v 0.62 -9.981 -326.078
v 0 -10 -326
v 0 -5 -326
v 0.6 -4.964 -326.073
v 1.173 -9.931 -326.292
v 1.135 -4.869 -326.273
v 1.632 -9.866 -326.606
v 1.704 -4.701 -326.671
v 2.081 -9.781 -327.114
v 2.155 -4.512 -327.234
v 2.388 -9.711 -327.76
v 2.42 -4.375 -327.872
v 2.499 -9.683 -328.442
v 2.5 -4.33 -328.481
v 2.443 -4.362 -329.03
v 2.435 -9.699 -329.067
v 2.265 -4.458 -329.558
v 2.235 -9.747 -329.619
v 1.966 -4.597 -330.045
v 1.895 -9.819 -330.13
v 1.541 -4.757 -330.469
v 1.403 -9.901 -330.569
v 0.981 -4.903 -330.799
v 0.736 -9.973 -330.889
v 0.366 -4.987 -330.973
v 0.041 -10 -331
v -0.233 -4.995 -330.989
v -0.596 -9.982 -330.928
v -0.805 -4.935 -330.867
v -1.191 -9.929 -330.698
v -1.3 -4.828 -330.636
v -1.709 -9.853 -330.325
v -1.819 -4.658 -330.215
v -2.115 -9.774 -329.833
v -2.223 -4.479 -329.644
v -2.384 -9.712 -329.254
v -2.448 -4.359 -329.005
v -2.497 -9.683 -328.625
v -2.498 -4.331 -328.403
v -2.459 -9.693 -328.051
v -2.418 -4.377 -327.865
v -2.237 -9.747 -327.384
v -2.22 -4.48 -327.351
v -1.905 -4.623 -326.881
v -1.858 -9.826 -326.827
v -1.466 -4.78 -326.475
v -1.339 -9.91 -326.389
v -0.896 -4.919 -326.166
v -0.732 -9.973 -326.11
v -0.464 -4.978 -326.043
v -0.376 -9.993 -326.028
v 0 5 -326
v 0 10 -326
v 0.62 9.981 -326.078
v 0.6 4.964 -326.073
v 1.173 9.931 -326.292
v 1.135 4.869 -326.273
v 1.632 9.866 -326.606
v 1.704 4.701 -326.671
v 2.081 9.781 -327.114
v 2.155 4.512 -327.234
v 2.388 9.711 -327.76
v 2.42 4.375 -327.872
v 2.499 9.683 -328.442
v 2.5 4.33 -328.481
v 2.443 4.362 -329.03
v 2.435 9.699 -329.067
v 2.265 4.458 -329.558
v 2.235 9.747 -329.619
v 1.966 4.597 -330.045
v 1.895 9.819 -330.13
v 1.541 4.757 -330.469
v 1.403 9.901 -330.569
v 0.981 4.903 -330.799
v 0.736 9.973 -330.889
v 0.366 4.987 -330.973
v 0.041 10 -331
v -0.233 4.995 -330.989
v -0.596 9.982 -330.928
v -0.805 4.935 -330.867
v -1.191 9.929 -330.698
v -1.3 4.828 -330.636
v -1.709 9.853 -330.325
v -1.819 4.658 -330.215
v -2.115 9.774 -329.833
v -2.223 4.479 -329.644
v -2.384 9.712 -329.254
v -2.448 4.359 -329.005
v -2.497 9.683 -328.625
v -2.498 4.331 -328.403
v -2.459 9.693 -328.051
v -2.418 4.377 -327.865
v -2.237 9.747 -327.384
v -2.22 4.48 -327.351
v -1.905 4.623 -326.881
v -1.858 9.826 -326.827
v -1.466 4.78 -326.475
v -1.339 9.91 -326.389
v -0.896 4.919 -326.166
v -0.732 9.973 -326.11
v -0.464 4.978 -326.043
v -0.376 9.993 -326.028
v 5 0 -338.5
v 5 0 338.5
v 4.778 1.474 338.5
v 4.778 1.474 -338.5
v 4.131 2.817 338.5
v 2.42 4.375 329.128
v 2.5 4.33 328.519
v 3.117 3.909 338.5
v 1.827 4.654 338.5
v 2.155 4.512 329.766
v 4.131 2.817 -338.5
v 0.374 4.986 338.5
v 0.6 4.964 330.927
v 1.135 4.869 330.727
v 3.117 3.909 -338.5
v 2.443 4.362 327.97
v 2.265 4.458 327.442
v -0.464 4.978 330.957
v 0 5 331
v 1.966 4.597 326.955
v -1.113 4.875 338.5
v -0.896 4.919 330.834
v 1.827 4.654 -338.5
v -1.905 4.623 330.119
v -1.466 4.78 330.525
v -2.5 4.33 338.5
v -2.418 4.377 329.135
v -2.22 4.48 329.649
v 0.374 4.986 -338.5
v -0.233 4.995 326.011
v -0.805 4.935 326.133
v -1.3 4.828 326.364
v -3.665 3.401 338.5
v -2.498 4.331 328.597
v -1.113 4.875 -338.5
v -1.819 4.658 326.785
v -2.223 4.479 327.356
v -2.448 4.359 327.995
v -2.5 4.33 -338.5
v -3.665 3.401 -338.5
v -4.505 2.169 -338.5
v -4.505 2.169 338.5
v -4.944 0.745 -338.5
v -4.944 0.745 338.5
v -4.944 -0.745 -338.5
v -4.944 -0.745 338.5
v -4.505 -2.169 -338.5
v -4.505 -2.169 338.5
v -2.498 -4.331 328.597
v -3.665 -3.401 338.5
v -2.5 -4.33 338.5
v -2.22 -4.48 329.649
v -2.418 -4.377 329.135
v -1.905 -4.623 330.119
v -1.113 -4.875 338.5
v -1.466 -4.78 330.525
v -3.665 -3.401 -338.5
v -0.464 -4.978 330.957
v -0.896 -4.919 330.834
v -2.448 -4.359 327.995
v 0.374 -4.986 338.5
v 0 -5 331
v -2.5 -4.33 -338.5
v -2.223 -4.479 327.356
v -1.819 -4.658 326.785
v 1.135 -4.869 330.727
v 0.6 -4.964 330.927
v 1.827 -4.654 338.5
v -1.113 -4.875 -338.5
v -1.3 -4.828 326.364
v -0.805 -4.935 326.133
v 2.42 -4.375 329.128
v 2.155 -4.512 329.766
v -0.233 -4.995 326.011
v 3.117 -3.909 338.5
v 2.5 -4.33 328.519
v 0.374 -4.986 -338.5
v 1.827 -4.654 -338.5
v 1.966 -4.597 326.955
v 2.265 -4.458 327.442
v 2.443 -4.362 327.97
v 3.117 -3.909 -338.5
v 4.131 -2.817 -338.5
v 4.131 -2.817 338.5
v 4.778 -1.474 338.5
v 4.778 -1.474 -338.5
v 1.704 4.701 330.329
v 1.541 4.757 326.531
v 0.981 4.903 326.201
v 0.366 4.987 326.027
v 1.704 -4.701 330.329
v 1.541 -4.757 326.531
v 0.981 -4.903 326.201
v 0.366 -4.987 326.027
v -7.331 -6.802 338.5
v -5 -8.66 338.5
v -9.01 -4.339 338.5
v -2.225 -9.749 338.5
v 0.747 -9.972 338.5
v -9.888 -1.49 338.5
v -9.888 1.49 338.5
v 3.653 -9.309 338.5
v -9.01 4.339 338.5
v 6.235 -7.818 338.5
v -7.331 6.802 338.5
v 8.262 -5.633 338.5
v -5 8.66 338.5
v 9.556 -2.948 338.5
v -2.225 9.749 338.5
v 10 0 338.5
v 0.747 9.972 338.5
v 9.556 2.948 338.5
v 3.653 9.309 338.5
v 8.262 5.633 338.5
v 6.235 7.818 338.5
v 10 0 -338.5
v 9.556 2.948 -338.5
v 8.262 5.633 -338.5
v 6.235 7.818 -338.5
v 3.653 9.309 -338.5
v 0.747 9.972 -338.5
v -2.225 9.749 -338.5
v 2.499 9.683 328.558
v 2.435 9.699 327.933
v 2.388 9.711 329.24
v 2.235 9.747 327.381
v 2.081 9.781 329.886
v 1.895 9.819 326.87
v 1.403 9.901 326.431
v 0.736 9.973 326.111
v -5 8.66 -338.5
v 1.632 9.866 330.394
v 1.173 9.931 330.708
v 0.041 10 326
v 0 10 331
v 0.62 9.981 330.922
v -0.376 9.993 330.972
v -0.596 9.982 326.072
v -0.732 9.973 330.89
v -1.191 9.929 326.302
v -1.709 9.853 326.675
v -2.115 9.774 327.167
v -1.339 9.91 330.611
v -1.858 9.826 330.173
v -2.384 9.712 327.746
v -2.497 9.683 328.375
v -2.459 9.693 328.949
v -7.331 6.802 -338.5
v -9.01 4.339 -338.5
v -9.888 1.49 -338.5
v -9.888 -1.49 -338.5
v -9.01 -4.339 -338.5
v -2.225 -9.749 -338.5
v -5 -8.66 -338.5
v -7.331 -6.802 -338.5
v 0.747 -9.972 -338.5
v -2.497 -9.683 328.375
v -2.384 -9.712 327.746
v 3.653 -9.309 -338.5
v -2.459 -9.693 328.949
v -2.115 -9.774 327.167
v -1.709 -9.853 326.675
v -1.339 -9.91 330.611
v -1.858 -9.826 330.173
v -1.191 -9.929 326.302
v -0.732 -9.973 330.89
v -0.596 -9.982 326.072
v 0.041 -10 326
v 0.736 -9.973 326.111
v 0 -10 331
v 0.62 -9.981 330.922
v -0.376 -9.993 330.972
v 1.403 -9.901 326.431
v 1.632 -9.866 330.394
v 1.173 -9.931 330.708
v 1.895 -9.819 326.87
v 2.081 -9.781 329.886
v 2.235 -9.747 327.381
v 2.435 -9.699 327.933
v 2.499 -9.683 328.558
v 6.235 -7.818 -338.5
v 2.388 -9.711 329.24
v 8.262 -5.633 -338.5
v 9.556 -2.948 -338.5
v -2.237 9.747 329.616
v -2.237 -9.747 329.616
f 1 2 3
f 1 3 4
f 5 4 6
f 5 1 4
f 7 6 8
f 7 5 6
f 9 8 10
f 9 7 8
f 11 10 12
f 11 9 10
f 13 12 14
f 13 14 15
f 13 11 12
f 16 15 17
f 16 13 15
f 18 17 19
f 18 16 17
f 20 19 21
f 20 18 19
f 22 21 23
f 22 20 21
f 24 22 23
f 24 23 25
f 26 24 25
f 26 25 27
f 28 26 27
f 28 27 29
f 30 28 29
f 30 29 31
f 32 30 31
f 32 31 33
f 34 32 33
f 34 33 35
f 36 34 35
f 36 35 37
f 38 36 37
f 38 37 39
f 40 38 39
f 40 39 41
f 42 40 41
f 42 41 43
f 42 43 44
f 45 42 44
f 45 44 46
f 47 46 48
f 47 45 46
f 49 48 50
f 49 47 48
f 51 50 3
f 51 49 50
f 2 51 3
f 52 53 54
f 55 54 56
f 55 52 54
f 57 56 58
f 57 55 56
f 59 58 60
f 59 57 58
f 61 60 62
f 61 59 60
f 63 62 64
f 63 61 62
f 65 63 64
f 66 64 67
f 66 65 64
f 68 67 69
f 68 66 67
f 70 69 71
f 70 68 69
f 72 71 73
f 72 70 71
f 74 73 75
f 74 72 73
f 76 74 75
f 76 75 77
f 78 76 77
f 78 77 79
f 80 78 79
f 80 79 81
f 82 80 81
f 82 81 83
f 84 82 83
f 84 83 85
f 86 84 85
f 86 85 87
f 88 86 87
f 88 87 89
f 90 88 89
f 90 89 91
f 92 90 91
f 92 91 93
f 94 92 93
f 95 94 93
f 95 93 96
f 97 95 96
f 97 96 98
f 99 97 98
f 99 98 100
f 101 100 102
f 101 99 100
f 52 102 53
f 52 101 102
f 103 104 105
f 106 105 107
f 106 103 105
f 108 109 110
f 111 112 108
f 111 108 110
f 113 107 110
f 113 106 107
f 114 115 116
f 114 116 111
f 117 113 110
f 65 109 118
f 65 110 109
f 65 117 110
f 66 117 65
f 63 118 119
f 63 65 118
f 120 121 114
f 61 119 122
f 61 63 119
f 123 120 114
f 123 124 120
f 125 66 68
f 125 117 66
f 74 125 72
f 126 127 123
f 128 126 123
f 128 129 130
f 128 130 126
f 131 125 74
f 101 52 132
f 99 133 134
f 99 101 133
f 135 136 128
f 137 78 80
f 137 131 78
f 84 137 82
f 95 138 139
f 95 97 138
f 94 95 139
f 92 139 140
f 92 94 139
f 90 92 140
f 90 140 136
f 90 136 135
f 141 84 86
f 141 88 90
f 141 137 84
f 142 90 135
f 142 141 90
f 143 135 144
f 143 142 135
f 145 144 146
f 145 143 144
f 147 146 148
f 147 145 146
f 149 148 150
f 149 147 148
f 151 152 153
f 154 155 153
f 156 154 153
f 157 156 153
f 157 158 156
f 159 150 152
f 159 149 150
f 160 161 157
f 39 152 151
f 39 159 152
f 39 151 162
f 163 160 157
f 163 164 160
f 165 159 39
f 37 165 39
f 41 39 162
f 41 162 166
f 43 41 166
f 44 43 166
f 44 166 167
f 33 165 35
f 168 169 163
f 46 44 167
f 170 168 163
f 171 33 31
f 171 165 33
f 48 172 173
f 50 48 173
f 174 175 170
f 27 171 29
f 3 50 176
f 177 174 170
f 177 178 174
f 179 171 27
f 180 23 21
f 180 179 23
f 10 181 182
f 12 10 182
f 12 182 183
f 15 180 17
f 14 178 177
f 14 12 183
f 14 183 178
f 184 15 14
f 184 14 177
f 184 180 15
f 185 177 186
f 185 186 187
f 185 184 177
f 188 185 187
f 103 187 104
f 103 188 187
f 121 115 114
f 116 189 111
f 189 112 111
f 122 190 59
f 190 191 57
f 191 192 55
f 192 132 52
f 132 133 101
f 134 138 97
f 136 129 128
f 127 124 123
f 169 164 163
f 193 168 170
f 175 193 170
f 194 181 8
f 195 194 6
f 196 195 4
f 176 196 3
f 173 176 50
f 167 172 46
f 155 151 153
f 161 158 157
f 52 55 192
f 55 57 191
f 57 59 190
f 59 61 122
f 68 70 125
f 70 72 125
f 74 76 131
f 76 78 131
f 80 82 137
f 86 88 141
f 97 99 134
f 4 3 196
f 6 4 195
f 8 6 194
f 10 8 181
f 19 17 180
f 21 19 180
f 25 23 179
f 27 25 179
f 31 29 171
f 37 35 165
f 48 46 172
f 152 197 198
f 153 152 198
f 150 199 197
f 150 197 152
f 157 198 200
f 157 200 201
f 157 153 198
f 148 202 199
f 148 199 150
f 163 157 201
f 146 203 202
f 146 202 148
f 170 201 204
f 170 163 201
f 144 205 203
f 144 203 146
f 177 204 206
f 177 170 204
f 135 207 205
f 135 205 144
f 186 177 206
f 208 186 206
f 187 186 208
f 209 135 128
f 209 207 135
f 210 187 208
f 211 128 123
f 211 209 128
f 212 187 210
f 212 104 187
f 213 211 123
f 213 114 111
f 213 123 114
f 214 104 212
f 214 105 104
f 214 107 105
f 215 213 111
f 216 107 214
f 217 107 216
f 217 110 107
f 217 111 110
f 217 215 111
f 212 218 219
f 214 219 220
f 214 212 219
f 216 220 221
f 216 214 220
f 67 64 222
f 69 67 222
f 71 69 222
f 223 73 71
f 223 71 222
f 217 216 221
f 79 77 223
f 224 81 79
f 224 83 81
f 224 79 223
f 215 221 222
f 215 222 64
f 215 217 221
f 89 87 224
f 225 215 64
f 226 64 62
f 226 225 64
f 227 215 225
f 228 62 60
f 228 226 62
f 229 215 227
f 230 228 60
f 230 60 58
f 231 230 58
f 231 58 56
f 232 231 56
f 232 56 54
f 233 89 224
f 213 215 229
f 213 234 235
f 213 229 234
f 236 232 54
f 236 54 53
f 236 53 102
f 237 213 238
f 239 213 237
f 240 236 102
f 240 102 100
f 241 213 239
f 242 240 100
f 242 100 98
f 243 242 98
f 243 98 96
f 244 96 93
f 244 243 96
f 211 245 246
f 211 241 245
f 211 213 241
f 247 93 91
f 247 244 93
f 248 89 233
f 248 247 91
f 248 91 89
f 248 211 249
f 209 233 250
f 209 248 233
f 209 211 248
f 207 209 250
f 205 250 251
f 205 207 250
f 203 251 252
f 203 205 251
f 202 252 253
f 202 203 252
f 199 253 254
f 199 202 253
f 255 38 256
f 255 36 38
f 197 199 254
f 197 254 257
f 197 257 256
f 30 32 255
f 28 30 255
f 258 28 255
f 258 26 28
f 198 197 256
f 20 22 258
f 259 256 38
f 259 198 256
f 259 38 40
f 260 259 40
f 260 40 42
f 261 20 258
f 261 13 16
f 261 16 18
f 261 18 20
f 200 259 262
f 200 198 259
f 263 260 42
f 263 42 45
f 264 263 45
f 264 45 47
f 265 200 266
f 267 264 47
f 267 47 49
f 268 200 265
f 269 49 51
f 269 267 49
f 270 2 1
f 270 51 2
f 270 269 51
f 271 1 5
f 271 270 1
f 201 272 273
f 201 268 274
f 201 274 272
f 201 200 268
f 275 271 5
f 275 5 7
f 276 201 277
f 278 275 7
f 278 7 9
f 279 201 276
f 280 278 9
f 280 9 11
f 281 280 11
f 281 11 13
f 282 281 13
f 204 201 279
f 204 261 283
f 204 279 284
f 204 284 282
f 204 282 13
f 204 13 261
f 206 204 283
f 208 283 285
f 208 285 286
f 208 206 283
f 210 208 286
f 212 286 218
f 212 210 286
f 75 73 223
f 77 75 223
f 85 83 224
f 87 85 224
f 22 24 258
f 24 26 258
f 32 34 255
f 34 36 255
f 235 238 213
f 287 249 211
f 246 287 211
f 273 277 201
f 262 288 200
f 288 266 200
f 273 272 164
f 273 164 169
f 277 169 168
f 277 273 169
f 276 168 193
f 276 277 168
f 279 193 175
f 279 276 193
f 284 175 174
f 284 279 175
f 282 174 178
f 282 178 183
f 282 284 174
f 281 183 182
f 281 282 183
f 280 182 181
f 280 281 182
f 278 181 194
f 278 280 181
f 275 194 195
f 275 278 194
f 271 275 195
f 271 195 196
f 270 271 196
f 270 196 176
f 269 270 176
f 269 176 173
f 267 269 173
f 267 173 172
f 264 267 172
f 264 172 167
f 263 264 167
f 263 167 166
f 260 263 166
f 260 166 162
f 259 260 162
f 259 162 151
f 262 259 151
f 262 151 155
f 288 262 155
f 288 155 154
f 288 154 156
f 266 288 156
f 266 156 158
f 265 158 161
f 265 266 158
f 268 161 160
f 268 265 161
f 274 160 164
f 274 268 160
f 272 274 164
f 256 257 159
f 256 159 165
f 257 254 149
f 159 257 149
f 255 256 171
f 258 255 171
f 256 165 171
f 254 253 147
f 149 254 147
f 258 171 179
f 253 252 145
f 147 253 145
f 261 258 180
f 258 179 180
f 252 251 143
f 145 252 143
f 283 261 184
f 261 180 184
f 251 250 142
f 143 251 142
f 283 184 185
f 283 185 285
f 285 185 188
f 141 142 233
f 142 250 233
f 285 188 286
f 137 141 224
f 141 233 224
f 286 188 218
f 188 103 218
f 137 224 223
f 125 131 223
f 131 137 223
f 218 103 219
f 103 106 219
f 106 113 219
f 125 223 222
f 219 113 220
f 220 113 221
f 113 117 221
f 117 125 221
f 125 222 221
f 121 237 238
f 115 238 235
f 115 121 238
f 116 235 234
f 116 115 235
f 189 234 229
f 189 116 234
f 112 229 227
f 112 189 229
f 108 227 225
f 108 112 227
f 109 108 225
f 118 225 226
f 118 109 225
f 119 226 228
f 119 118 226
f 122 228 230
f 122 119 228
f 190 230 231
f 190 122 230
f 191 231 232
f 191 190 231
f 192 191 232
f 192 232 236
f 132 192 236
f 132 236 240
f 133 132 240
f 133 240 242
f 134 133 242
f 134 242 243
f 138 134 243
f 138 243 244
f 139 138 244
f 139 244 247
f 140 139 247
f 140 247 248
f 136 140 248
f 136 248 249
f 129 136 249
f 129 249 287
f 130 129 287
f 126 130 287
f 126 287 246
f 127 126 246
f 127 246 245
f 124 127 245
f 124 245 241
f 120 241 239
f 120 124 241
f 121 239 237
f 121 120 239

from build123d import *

# Parameters (mm, degrees)
SKETCH1_R               = 10
SKETCH1_R_2             = 5
BOSS_EXTRUDE1_DEPTH     = 338.5
CUT_EXTRUDE1_DEPTH      = 339.795292175
CUT_EXTRUDE1_DEPTH_BACK = 339.795292175
SKETCH2_R               = 2.5


with BuildPart() as part:
    # Sketch1 → Boss-Extrude1 (new, symmetric)
    with BuildSketch(Plane.XY):
        Circle(SKETCH1_R)
        Circle(SKETCH1_R_2, mode=Mode.SUBTRACT)
    extrude(amount=BOSS_EXTRUDE1_DEPTH, both=True)

    # Sketch2 → Cut-Extrude1 (cut, two sides: drawn at the far end of the back side and taken through both)
    with BuildSketch(Plane(origin=(0, 0, 0), x_dir=(1, 0, 0), z_dir=(0, 1, 0)).offset(-CUT_EXTRUDE1_DEPTH_BACK)):
        with Locations(Location((0, -328.5, 0), (0, 0, 270))):
            Circle(SKETCH2_R)
        with Locations(Location((0, 328.5, 0), (0, 0, 270))):
            Circle(SKETCH2_R)
    extrude(amount=CUT_EXTRUDE1_DEPTH + CUT_EXTRUDE1_DEPTH_BACK, mode=Mode.SUBTRACT)


solid = part.part
